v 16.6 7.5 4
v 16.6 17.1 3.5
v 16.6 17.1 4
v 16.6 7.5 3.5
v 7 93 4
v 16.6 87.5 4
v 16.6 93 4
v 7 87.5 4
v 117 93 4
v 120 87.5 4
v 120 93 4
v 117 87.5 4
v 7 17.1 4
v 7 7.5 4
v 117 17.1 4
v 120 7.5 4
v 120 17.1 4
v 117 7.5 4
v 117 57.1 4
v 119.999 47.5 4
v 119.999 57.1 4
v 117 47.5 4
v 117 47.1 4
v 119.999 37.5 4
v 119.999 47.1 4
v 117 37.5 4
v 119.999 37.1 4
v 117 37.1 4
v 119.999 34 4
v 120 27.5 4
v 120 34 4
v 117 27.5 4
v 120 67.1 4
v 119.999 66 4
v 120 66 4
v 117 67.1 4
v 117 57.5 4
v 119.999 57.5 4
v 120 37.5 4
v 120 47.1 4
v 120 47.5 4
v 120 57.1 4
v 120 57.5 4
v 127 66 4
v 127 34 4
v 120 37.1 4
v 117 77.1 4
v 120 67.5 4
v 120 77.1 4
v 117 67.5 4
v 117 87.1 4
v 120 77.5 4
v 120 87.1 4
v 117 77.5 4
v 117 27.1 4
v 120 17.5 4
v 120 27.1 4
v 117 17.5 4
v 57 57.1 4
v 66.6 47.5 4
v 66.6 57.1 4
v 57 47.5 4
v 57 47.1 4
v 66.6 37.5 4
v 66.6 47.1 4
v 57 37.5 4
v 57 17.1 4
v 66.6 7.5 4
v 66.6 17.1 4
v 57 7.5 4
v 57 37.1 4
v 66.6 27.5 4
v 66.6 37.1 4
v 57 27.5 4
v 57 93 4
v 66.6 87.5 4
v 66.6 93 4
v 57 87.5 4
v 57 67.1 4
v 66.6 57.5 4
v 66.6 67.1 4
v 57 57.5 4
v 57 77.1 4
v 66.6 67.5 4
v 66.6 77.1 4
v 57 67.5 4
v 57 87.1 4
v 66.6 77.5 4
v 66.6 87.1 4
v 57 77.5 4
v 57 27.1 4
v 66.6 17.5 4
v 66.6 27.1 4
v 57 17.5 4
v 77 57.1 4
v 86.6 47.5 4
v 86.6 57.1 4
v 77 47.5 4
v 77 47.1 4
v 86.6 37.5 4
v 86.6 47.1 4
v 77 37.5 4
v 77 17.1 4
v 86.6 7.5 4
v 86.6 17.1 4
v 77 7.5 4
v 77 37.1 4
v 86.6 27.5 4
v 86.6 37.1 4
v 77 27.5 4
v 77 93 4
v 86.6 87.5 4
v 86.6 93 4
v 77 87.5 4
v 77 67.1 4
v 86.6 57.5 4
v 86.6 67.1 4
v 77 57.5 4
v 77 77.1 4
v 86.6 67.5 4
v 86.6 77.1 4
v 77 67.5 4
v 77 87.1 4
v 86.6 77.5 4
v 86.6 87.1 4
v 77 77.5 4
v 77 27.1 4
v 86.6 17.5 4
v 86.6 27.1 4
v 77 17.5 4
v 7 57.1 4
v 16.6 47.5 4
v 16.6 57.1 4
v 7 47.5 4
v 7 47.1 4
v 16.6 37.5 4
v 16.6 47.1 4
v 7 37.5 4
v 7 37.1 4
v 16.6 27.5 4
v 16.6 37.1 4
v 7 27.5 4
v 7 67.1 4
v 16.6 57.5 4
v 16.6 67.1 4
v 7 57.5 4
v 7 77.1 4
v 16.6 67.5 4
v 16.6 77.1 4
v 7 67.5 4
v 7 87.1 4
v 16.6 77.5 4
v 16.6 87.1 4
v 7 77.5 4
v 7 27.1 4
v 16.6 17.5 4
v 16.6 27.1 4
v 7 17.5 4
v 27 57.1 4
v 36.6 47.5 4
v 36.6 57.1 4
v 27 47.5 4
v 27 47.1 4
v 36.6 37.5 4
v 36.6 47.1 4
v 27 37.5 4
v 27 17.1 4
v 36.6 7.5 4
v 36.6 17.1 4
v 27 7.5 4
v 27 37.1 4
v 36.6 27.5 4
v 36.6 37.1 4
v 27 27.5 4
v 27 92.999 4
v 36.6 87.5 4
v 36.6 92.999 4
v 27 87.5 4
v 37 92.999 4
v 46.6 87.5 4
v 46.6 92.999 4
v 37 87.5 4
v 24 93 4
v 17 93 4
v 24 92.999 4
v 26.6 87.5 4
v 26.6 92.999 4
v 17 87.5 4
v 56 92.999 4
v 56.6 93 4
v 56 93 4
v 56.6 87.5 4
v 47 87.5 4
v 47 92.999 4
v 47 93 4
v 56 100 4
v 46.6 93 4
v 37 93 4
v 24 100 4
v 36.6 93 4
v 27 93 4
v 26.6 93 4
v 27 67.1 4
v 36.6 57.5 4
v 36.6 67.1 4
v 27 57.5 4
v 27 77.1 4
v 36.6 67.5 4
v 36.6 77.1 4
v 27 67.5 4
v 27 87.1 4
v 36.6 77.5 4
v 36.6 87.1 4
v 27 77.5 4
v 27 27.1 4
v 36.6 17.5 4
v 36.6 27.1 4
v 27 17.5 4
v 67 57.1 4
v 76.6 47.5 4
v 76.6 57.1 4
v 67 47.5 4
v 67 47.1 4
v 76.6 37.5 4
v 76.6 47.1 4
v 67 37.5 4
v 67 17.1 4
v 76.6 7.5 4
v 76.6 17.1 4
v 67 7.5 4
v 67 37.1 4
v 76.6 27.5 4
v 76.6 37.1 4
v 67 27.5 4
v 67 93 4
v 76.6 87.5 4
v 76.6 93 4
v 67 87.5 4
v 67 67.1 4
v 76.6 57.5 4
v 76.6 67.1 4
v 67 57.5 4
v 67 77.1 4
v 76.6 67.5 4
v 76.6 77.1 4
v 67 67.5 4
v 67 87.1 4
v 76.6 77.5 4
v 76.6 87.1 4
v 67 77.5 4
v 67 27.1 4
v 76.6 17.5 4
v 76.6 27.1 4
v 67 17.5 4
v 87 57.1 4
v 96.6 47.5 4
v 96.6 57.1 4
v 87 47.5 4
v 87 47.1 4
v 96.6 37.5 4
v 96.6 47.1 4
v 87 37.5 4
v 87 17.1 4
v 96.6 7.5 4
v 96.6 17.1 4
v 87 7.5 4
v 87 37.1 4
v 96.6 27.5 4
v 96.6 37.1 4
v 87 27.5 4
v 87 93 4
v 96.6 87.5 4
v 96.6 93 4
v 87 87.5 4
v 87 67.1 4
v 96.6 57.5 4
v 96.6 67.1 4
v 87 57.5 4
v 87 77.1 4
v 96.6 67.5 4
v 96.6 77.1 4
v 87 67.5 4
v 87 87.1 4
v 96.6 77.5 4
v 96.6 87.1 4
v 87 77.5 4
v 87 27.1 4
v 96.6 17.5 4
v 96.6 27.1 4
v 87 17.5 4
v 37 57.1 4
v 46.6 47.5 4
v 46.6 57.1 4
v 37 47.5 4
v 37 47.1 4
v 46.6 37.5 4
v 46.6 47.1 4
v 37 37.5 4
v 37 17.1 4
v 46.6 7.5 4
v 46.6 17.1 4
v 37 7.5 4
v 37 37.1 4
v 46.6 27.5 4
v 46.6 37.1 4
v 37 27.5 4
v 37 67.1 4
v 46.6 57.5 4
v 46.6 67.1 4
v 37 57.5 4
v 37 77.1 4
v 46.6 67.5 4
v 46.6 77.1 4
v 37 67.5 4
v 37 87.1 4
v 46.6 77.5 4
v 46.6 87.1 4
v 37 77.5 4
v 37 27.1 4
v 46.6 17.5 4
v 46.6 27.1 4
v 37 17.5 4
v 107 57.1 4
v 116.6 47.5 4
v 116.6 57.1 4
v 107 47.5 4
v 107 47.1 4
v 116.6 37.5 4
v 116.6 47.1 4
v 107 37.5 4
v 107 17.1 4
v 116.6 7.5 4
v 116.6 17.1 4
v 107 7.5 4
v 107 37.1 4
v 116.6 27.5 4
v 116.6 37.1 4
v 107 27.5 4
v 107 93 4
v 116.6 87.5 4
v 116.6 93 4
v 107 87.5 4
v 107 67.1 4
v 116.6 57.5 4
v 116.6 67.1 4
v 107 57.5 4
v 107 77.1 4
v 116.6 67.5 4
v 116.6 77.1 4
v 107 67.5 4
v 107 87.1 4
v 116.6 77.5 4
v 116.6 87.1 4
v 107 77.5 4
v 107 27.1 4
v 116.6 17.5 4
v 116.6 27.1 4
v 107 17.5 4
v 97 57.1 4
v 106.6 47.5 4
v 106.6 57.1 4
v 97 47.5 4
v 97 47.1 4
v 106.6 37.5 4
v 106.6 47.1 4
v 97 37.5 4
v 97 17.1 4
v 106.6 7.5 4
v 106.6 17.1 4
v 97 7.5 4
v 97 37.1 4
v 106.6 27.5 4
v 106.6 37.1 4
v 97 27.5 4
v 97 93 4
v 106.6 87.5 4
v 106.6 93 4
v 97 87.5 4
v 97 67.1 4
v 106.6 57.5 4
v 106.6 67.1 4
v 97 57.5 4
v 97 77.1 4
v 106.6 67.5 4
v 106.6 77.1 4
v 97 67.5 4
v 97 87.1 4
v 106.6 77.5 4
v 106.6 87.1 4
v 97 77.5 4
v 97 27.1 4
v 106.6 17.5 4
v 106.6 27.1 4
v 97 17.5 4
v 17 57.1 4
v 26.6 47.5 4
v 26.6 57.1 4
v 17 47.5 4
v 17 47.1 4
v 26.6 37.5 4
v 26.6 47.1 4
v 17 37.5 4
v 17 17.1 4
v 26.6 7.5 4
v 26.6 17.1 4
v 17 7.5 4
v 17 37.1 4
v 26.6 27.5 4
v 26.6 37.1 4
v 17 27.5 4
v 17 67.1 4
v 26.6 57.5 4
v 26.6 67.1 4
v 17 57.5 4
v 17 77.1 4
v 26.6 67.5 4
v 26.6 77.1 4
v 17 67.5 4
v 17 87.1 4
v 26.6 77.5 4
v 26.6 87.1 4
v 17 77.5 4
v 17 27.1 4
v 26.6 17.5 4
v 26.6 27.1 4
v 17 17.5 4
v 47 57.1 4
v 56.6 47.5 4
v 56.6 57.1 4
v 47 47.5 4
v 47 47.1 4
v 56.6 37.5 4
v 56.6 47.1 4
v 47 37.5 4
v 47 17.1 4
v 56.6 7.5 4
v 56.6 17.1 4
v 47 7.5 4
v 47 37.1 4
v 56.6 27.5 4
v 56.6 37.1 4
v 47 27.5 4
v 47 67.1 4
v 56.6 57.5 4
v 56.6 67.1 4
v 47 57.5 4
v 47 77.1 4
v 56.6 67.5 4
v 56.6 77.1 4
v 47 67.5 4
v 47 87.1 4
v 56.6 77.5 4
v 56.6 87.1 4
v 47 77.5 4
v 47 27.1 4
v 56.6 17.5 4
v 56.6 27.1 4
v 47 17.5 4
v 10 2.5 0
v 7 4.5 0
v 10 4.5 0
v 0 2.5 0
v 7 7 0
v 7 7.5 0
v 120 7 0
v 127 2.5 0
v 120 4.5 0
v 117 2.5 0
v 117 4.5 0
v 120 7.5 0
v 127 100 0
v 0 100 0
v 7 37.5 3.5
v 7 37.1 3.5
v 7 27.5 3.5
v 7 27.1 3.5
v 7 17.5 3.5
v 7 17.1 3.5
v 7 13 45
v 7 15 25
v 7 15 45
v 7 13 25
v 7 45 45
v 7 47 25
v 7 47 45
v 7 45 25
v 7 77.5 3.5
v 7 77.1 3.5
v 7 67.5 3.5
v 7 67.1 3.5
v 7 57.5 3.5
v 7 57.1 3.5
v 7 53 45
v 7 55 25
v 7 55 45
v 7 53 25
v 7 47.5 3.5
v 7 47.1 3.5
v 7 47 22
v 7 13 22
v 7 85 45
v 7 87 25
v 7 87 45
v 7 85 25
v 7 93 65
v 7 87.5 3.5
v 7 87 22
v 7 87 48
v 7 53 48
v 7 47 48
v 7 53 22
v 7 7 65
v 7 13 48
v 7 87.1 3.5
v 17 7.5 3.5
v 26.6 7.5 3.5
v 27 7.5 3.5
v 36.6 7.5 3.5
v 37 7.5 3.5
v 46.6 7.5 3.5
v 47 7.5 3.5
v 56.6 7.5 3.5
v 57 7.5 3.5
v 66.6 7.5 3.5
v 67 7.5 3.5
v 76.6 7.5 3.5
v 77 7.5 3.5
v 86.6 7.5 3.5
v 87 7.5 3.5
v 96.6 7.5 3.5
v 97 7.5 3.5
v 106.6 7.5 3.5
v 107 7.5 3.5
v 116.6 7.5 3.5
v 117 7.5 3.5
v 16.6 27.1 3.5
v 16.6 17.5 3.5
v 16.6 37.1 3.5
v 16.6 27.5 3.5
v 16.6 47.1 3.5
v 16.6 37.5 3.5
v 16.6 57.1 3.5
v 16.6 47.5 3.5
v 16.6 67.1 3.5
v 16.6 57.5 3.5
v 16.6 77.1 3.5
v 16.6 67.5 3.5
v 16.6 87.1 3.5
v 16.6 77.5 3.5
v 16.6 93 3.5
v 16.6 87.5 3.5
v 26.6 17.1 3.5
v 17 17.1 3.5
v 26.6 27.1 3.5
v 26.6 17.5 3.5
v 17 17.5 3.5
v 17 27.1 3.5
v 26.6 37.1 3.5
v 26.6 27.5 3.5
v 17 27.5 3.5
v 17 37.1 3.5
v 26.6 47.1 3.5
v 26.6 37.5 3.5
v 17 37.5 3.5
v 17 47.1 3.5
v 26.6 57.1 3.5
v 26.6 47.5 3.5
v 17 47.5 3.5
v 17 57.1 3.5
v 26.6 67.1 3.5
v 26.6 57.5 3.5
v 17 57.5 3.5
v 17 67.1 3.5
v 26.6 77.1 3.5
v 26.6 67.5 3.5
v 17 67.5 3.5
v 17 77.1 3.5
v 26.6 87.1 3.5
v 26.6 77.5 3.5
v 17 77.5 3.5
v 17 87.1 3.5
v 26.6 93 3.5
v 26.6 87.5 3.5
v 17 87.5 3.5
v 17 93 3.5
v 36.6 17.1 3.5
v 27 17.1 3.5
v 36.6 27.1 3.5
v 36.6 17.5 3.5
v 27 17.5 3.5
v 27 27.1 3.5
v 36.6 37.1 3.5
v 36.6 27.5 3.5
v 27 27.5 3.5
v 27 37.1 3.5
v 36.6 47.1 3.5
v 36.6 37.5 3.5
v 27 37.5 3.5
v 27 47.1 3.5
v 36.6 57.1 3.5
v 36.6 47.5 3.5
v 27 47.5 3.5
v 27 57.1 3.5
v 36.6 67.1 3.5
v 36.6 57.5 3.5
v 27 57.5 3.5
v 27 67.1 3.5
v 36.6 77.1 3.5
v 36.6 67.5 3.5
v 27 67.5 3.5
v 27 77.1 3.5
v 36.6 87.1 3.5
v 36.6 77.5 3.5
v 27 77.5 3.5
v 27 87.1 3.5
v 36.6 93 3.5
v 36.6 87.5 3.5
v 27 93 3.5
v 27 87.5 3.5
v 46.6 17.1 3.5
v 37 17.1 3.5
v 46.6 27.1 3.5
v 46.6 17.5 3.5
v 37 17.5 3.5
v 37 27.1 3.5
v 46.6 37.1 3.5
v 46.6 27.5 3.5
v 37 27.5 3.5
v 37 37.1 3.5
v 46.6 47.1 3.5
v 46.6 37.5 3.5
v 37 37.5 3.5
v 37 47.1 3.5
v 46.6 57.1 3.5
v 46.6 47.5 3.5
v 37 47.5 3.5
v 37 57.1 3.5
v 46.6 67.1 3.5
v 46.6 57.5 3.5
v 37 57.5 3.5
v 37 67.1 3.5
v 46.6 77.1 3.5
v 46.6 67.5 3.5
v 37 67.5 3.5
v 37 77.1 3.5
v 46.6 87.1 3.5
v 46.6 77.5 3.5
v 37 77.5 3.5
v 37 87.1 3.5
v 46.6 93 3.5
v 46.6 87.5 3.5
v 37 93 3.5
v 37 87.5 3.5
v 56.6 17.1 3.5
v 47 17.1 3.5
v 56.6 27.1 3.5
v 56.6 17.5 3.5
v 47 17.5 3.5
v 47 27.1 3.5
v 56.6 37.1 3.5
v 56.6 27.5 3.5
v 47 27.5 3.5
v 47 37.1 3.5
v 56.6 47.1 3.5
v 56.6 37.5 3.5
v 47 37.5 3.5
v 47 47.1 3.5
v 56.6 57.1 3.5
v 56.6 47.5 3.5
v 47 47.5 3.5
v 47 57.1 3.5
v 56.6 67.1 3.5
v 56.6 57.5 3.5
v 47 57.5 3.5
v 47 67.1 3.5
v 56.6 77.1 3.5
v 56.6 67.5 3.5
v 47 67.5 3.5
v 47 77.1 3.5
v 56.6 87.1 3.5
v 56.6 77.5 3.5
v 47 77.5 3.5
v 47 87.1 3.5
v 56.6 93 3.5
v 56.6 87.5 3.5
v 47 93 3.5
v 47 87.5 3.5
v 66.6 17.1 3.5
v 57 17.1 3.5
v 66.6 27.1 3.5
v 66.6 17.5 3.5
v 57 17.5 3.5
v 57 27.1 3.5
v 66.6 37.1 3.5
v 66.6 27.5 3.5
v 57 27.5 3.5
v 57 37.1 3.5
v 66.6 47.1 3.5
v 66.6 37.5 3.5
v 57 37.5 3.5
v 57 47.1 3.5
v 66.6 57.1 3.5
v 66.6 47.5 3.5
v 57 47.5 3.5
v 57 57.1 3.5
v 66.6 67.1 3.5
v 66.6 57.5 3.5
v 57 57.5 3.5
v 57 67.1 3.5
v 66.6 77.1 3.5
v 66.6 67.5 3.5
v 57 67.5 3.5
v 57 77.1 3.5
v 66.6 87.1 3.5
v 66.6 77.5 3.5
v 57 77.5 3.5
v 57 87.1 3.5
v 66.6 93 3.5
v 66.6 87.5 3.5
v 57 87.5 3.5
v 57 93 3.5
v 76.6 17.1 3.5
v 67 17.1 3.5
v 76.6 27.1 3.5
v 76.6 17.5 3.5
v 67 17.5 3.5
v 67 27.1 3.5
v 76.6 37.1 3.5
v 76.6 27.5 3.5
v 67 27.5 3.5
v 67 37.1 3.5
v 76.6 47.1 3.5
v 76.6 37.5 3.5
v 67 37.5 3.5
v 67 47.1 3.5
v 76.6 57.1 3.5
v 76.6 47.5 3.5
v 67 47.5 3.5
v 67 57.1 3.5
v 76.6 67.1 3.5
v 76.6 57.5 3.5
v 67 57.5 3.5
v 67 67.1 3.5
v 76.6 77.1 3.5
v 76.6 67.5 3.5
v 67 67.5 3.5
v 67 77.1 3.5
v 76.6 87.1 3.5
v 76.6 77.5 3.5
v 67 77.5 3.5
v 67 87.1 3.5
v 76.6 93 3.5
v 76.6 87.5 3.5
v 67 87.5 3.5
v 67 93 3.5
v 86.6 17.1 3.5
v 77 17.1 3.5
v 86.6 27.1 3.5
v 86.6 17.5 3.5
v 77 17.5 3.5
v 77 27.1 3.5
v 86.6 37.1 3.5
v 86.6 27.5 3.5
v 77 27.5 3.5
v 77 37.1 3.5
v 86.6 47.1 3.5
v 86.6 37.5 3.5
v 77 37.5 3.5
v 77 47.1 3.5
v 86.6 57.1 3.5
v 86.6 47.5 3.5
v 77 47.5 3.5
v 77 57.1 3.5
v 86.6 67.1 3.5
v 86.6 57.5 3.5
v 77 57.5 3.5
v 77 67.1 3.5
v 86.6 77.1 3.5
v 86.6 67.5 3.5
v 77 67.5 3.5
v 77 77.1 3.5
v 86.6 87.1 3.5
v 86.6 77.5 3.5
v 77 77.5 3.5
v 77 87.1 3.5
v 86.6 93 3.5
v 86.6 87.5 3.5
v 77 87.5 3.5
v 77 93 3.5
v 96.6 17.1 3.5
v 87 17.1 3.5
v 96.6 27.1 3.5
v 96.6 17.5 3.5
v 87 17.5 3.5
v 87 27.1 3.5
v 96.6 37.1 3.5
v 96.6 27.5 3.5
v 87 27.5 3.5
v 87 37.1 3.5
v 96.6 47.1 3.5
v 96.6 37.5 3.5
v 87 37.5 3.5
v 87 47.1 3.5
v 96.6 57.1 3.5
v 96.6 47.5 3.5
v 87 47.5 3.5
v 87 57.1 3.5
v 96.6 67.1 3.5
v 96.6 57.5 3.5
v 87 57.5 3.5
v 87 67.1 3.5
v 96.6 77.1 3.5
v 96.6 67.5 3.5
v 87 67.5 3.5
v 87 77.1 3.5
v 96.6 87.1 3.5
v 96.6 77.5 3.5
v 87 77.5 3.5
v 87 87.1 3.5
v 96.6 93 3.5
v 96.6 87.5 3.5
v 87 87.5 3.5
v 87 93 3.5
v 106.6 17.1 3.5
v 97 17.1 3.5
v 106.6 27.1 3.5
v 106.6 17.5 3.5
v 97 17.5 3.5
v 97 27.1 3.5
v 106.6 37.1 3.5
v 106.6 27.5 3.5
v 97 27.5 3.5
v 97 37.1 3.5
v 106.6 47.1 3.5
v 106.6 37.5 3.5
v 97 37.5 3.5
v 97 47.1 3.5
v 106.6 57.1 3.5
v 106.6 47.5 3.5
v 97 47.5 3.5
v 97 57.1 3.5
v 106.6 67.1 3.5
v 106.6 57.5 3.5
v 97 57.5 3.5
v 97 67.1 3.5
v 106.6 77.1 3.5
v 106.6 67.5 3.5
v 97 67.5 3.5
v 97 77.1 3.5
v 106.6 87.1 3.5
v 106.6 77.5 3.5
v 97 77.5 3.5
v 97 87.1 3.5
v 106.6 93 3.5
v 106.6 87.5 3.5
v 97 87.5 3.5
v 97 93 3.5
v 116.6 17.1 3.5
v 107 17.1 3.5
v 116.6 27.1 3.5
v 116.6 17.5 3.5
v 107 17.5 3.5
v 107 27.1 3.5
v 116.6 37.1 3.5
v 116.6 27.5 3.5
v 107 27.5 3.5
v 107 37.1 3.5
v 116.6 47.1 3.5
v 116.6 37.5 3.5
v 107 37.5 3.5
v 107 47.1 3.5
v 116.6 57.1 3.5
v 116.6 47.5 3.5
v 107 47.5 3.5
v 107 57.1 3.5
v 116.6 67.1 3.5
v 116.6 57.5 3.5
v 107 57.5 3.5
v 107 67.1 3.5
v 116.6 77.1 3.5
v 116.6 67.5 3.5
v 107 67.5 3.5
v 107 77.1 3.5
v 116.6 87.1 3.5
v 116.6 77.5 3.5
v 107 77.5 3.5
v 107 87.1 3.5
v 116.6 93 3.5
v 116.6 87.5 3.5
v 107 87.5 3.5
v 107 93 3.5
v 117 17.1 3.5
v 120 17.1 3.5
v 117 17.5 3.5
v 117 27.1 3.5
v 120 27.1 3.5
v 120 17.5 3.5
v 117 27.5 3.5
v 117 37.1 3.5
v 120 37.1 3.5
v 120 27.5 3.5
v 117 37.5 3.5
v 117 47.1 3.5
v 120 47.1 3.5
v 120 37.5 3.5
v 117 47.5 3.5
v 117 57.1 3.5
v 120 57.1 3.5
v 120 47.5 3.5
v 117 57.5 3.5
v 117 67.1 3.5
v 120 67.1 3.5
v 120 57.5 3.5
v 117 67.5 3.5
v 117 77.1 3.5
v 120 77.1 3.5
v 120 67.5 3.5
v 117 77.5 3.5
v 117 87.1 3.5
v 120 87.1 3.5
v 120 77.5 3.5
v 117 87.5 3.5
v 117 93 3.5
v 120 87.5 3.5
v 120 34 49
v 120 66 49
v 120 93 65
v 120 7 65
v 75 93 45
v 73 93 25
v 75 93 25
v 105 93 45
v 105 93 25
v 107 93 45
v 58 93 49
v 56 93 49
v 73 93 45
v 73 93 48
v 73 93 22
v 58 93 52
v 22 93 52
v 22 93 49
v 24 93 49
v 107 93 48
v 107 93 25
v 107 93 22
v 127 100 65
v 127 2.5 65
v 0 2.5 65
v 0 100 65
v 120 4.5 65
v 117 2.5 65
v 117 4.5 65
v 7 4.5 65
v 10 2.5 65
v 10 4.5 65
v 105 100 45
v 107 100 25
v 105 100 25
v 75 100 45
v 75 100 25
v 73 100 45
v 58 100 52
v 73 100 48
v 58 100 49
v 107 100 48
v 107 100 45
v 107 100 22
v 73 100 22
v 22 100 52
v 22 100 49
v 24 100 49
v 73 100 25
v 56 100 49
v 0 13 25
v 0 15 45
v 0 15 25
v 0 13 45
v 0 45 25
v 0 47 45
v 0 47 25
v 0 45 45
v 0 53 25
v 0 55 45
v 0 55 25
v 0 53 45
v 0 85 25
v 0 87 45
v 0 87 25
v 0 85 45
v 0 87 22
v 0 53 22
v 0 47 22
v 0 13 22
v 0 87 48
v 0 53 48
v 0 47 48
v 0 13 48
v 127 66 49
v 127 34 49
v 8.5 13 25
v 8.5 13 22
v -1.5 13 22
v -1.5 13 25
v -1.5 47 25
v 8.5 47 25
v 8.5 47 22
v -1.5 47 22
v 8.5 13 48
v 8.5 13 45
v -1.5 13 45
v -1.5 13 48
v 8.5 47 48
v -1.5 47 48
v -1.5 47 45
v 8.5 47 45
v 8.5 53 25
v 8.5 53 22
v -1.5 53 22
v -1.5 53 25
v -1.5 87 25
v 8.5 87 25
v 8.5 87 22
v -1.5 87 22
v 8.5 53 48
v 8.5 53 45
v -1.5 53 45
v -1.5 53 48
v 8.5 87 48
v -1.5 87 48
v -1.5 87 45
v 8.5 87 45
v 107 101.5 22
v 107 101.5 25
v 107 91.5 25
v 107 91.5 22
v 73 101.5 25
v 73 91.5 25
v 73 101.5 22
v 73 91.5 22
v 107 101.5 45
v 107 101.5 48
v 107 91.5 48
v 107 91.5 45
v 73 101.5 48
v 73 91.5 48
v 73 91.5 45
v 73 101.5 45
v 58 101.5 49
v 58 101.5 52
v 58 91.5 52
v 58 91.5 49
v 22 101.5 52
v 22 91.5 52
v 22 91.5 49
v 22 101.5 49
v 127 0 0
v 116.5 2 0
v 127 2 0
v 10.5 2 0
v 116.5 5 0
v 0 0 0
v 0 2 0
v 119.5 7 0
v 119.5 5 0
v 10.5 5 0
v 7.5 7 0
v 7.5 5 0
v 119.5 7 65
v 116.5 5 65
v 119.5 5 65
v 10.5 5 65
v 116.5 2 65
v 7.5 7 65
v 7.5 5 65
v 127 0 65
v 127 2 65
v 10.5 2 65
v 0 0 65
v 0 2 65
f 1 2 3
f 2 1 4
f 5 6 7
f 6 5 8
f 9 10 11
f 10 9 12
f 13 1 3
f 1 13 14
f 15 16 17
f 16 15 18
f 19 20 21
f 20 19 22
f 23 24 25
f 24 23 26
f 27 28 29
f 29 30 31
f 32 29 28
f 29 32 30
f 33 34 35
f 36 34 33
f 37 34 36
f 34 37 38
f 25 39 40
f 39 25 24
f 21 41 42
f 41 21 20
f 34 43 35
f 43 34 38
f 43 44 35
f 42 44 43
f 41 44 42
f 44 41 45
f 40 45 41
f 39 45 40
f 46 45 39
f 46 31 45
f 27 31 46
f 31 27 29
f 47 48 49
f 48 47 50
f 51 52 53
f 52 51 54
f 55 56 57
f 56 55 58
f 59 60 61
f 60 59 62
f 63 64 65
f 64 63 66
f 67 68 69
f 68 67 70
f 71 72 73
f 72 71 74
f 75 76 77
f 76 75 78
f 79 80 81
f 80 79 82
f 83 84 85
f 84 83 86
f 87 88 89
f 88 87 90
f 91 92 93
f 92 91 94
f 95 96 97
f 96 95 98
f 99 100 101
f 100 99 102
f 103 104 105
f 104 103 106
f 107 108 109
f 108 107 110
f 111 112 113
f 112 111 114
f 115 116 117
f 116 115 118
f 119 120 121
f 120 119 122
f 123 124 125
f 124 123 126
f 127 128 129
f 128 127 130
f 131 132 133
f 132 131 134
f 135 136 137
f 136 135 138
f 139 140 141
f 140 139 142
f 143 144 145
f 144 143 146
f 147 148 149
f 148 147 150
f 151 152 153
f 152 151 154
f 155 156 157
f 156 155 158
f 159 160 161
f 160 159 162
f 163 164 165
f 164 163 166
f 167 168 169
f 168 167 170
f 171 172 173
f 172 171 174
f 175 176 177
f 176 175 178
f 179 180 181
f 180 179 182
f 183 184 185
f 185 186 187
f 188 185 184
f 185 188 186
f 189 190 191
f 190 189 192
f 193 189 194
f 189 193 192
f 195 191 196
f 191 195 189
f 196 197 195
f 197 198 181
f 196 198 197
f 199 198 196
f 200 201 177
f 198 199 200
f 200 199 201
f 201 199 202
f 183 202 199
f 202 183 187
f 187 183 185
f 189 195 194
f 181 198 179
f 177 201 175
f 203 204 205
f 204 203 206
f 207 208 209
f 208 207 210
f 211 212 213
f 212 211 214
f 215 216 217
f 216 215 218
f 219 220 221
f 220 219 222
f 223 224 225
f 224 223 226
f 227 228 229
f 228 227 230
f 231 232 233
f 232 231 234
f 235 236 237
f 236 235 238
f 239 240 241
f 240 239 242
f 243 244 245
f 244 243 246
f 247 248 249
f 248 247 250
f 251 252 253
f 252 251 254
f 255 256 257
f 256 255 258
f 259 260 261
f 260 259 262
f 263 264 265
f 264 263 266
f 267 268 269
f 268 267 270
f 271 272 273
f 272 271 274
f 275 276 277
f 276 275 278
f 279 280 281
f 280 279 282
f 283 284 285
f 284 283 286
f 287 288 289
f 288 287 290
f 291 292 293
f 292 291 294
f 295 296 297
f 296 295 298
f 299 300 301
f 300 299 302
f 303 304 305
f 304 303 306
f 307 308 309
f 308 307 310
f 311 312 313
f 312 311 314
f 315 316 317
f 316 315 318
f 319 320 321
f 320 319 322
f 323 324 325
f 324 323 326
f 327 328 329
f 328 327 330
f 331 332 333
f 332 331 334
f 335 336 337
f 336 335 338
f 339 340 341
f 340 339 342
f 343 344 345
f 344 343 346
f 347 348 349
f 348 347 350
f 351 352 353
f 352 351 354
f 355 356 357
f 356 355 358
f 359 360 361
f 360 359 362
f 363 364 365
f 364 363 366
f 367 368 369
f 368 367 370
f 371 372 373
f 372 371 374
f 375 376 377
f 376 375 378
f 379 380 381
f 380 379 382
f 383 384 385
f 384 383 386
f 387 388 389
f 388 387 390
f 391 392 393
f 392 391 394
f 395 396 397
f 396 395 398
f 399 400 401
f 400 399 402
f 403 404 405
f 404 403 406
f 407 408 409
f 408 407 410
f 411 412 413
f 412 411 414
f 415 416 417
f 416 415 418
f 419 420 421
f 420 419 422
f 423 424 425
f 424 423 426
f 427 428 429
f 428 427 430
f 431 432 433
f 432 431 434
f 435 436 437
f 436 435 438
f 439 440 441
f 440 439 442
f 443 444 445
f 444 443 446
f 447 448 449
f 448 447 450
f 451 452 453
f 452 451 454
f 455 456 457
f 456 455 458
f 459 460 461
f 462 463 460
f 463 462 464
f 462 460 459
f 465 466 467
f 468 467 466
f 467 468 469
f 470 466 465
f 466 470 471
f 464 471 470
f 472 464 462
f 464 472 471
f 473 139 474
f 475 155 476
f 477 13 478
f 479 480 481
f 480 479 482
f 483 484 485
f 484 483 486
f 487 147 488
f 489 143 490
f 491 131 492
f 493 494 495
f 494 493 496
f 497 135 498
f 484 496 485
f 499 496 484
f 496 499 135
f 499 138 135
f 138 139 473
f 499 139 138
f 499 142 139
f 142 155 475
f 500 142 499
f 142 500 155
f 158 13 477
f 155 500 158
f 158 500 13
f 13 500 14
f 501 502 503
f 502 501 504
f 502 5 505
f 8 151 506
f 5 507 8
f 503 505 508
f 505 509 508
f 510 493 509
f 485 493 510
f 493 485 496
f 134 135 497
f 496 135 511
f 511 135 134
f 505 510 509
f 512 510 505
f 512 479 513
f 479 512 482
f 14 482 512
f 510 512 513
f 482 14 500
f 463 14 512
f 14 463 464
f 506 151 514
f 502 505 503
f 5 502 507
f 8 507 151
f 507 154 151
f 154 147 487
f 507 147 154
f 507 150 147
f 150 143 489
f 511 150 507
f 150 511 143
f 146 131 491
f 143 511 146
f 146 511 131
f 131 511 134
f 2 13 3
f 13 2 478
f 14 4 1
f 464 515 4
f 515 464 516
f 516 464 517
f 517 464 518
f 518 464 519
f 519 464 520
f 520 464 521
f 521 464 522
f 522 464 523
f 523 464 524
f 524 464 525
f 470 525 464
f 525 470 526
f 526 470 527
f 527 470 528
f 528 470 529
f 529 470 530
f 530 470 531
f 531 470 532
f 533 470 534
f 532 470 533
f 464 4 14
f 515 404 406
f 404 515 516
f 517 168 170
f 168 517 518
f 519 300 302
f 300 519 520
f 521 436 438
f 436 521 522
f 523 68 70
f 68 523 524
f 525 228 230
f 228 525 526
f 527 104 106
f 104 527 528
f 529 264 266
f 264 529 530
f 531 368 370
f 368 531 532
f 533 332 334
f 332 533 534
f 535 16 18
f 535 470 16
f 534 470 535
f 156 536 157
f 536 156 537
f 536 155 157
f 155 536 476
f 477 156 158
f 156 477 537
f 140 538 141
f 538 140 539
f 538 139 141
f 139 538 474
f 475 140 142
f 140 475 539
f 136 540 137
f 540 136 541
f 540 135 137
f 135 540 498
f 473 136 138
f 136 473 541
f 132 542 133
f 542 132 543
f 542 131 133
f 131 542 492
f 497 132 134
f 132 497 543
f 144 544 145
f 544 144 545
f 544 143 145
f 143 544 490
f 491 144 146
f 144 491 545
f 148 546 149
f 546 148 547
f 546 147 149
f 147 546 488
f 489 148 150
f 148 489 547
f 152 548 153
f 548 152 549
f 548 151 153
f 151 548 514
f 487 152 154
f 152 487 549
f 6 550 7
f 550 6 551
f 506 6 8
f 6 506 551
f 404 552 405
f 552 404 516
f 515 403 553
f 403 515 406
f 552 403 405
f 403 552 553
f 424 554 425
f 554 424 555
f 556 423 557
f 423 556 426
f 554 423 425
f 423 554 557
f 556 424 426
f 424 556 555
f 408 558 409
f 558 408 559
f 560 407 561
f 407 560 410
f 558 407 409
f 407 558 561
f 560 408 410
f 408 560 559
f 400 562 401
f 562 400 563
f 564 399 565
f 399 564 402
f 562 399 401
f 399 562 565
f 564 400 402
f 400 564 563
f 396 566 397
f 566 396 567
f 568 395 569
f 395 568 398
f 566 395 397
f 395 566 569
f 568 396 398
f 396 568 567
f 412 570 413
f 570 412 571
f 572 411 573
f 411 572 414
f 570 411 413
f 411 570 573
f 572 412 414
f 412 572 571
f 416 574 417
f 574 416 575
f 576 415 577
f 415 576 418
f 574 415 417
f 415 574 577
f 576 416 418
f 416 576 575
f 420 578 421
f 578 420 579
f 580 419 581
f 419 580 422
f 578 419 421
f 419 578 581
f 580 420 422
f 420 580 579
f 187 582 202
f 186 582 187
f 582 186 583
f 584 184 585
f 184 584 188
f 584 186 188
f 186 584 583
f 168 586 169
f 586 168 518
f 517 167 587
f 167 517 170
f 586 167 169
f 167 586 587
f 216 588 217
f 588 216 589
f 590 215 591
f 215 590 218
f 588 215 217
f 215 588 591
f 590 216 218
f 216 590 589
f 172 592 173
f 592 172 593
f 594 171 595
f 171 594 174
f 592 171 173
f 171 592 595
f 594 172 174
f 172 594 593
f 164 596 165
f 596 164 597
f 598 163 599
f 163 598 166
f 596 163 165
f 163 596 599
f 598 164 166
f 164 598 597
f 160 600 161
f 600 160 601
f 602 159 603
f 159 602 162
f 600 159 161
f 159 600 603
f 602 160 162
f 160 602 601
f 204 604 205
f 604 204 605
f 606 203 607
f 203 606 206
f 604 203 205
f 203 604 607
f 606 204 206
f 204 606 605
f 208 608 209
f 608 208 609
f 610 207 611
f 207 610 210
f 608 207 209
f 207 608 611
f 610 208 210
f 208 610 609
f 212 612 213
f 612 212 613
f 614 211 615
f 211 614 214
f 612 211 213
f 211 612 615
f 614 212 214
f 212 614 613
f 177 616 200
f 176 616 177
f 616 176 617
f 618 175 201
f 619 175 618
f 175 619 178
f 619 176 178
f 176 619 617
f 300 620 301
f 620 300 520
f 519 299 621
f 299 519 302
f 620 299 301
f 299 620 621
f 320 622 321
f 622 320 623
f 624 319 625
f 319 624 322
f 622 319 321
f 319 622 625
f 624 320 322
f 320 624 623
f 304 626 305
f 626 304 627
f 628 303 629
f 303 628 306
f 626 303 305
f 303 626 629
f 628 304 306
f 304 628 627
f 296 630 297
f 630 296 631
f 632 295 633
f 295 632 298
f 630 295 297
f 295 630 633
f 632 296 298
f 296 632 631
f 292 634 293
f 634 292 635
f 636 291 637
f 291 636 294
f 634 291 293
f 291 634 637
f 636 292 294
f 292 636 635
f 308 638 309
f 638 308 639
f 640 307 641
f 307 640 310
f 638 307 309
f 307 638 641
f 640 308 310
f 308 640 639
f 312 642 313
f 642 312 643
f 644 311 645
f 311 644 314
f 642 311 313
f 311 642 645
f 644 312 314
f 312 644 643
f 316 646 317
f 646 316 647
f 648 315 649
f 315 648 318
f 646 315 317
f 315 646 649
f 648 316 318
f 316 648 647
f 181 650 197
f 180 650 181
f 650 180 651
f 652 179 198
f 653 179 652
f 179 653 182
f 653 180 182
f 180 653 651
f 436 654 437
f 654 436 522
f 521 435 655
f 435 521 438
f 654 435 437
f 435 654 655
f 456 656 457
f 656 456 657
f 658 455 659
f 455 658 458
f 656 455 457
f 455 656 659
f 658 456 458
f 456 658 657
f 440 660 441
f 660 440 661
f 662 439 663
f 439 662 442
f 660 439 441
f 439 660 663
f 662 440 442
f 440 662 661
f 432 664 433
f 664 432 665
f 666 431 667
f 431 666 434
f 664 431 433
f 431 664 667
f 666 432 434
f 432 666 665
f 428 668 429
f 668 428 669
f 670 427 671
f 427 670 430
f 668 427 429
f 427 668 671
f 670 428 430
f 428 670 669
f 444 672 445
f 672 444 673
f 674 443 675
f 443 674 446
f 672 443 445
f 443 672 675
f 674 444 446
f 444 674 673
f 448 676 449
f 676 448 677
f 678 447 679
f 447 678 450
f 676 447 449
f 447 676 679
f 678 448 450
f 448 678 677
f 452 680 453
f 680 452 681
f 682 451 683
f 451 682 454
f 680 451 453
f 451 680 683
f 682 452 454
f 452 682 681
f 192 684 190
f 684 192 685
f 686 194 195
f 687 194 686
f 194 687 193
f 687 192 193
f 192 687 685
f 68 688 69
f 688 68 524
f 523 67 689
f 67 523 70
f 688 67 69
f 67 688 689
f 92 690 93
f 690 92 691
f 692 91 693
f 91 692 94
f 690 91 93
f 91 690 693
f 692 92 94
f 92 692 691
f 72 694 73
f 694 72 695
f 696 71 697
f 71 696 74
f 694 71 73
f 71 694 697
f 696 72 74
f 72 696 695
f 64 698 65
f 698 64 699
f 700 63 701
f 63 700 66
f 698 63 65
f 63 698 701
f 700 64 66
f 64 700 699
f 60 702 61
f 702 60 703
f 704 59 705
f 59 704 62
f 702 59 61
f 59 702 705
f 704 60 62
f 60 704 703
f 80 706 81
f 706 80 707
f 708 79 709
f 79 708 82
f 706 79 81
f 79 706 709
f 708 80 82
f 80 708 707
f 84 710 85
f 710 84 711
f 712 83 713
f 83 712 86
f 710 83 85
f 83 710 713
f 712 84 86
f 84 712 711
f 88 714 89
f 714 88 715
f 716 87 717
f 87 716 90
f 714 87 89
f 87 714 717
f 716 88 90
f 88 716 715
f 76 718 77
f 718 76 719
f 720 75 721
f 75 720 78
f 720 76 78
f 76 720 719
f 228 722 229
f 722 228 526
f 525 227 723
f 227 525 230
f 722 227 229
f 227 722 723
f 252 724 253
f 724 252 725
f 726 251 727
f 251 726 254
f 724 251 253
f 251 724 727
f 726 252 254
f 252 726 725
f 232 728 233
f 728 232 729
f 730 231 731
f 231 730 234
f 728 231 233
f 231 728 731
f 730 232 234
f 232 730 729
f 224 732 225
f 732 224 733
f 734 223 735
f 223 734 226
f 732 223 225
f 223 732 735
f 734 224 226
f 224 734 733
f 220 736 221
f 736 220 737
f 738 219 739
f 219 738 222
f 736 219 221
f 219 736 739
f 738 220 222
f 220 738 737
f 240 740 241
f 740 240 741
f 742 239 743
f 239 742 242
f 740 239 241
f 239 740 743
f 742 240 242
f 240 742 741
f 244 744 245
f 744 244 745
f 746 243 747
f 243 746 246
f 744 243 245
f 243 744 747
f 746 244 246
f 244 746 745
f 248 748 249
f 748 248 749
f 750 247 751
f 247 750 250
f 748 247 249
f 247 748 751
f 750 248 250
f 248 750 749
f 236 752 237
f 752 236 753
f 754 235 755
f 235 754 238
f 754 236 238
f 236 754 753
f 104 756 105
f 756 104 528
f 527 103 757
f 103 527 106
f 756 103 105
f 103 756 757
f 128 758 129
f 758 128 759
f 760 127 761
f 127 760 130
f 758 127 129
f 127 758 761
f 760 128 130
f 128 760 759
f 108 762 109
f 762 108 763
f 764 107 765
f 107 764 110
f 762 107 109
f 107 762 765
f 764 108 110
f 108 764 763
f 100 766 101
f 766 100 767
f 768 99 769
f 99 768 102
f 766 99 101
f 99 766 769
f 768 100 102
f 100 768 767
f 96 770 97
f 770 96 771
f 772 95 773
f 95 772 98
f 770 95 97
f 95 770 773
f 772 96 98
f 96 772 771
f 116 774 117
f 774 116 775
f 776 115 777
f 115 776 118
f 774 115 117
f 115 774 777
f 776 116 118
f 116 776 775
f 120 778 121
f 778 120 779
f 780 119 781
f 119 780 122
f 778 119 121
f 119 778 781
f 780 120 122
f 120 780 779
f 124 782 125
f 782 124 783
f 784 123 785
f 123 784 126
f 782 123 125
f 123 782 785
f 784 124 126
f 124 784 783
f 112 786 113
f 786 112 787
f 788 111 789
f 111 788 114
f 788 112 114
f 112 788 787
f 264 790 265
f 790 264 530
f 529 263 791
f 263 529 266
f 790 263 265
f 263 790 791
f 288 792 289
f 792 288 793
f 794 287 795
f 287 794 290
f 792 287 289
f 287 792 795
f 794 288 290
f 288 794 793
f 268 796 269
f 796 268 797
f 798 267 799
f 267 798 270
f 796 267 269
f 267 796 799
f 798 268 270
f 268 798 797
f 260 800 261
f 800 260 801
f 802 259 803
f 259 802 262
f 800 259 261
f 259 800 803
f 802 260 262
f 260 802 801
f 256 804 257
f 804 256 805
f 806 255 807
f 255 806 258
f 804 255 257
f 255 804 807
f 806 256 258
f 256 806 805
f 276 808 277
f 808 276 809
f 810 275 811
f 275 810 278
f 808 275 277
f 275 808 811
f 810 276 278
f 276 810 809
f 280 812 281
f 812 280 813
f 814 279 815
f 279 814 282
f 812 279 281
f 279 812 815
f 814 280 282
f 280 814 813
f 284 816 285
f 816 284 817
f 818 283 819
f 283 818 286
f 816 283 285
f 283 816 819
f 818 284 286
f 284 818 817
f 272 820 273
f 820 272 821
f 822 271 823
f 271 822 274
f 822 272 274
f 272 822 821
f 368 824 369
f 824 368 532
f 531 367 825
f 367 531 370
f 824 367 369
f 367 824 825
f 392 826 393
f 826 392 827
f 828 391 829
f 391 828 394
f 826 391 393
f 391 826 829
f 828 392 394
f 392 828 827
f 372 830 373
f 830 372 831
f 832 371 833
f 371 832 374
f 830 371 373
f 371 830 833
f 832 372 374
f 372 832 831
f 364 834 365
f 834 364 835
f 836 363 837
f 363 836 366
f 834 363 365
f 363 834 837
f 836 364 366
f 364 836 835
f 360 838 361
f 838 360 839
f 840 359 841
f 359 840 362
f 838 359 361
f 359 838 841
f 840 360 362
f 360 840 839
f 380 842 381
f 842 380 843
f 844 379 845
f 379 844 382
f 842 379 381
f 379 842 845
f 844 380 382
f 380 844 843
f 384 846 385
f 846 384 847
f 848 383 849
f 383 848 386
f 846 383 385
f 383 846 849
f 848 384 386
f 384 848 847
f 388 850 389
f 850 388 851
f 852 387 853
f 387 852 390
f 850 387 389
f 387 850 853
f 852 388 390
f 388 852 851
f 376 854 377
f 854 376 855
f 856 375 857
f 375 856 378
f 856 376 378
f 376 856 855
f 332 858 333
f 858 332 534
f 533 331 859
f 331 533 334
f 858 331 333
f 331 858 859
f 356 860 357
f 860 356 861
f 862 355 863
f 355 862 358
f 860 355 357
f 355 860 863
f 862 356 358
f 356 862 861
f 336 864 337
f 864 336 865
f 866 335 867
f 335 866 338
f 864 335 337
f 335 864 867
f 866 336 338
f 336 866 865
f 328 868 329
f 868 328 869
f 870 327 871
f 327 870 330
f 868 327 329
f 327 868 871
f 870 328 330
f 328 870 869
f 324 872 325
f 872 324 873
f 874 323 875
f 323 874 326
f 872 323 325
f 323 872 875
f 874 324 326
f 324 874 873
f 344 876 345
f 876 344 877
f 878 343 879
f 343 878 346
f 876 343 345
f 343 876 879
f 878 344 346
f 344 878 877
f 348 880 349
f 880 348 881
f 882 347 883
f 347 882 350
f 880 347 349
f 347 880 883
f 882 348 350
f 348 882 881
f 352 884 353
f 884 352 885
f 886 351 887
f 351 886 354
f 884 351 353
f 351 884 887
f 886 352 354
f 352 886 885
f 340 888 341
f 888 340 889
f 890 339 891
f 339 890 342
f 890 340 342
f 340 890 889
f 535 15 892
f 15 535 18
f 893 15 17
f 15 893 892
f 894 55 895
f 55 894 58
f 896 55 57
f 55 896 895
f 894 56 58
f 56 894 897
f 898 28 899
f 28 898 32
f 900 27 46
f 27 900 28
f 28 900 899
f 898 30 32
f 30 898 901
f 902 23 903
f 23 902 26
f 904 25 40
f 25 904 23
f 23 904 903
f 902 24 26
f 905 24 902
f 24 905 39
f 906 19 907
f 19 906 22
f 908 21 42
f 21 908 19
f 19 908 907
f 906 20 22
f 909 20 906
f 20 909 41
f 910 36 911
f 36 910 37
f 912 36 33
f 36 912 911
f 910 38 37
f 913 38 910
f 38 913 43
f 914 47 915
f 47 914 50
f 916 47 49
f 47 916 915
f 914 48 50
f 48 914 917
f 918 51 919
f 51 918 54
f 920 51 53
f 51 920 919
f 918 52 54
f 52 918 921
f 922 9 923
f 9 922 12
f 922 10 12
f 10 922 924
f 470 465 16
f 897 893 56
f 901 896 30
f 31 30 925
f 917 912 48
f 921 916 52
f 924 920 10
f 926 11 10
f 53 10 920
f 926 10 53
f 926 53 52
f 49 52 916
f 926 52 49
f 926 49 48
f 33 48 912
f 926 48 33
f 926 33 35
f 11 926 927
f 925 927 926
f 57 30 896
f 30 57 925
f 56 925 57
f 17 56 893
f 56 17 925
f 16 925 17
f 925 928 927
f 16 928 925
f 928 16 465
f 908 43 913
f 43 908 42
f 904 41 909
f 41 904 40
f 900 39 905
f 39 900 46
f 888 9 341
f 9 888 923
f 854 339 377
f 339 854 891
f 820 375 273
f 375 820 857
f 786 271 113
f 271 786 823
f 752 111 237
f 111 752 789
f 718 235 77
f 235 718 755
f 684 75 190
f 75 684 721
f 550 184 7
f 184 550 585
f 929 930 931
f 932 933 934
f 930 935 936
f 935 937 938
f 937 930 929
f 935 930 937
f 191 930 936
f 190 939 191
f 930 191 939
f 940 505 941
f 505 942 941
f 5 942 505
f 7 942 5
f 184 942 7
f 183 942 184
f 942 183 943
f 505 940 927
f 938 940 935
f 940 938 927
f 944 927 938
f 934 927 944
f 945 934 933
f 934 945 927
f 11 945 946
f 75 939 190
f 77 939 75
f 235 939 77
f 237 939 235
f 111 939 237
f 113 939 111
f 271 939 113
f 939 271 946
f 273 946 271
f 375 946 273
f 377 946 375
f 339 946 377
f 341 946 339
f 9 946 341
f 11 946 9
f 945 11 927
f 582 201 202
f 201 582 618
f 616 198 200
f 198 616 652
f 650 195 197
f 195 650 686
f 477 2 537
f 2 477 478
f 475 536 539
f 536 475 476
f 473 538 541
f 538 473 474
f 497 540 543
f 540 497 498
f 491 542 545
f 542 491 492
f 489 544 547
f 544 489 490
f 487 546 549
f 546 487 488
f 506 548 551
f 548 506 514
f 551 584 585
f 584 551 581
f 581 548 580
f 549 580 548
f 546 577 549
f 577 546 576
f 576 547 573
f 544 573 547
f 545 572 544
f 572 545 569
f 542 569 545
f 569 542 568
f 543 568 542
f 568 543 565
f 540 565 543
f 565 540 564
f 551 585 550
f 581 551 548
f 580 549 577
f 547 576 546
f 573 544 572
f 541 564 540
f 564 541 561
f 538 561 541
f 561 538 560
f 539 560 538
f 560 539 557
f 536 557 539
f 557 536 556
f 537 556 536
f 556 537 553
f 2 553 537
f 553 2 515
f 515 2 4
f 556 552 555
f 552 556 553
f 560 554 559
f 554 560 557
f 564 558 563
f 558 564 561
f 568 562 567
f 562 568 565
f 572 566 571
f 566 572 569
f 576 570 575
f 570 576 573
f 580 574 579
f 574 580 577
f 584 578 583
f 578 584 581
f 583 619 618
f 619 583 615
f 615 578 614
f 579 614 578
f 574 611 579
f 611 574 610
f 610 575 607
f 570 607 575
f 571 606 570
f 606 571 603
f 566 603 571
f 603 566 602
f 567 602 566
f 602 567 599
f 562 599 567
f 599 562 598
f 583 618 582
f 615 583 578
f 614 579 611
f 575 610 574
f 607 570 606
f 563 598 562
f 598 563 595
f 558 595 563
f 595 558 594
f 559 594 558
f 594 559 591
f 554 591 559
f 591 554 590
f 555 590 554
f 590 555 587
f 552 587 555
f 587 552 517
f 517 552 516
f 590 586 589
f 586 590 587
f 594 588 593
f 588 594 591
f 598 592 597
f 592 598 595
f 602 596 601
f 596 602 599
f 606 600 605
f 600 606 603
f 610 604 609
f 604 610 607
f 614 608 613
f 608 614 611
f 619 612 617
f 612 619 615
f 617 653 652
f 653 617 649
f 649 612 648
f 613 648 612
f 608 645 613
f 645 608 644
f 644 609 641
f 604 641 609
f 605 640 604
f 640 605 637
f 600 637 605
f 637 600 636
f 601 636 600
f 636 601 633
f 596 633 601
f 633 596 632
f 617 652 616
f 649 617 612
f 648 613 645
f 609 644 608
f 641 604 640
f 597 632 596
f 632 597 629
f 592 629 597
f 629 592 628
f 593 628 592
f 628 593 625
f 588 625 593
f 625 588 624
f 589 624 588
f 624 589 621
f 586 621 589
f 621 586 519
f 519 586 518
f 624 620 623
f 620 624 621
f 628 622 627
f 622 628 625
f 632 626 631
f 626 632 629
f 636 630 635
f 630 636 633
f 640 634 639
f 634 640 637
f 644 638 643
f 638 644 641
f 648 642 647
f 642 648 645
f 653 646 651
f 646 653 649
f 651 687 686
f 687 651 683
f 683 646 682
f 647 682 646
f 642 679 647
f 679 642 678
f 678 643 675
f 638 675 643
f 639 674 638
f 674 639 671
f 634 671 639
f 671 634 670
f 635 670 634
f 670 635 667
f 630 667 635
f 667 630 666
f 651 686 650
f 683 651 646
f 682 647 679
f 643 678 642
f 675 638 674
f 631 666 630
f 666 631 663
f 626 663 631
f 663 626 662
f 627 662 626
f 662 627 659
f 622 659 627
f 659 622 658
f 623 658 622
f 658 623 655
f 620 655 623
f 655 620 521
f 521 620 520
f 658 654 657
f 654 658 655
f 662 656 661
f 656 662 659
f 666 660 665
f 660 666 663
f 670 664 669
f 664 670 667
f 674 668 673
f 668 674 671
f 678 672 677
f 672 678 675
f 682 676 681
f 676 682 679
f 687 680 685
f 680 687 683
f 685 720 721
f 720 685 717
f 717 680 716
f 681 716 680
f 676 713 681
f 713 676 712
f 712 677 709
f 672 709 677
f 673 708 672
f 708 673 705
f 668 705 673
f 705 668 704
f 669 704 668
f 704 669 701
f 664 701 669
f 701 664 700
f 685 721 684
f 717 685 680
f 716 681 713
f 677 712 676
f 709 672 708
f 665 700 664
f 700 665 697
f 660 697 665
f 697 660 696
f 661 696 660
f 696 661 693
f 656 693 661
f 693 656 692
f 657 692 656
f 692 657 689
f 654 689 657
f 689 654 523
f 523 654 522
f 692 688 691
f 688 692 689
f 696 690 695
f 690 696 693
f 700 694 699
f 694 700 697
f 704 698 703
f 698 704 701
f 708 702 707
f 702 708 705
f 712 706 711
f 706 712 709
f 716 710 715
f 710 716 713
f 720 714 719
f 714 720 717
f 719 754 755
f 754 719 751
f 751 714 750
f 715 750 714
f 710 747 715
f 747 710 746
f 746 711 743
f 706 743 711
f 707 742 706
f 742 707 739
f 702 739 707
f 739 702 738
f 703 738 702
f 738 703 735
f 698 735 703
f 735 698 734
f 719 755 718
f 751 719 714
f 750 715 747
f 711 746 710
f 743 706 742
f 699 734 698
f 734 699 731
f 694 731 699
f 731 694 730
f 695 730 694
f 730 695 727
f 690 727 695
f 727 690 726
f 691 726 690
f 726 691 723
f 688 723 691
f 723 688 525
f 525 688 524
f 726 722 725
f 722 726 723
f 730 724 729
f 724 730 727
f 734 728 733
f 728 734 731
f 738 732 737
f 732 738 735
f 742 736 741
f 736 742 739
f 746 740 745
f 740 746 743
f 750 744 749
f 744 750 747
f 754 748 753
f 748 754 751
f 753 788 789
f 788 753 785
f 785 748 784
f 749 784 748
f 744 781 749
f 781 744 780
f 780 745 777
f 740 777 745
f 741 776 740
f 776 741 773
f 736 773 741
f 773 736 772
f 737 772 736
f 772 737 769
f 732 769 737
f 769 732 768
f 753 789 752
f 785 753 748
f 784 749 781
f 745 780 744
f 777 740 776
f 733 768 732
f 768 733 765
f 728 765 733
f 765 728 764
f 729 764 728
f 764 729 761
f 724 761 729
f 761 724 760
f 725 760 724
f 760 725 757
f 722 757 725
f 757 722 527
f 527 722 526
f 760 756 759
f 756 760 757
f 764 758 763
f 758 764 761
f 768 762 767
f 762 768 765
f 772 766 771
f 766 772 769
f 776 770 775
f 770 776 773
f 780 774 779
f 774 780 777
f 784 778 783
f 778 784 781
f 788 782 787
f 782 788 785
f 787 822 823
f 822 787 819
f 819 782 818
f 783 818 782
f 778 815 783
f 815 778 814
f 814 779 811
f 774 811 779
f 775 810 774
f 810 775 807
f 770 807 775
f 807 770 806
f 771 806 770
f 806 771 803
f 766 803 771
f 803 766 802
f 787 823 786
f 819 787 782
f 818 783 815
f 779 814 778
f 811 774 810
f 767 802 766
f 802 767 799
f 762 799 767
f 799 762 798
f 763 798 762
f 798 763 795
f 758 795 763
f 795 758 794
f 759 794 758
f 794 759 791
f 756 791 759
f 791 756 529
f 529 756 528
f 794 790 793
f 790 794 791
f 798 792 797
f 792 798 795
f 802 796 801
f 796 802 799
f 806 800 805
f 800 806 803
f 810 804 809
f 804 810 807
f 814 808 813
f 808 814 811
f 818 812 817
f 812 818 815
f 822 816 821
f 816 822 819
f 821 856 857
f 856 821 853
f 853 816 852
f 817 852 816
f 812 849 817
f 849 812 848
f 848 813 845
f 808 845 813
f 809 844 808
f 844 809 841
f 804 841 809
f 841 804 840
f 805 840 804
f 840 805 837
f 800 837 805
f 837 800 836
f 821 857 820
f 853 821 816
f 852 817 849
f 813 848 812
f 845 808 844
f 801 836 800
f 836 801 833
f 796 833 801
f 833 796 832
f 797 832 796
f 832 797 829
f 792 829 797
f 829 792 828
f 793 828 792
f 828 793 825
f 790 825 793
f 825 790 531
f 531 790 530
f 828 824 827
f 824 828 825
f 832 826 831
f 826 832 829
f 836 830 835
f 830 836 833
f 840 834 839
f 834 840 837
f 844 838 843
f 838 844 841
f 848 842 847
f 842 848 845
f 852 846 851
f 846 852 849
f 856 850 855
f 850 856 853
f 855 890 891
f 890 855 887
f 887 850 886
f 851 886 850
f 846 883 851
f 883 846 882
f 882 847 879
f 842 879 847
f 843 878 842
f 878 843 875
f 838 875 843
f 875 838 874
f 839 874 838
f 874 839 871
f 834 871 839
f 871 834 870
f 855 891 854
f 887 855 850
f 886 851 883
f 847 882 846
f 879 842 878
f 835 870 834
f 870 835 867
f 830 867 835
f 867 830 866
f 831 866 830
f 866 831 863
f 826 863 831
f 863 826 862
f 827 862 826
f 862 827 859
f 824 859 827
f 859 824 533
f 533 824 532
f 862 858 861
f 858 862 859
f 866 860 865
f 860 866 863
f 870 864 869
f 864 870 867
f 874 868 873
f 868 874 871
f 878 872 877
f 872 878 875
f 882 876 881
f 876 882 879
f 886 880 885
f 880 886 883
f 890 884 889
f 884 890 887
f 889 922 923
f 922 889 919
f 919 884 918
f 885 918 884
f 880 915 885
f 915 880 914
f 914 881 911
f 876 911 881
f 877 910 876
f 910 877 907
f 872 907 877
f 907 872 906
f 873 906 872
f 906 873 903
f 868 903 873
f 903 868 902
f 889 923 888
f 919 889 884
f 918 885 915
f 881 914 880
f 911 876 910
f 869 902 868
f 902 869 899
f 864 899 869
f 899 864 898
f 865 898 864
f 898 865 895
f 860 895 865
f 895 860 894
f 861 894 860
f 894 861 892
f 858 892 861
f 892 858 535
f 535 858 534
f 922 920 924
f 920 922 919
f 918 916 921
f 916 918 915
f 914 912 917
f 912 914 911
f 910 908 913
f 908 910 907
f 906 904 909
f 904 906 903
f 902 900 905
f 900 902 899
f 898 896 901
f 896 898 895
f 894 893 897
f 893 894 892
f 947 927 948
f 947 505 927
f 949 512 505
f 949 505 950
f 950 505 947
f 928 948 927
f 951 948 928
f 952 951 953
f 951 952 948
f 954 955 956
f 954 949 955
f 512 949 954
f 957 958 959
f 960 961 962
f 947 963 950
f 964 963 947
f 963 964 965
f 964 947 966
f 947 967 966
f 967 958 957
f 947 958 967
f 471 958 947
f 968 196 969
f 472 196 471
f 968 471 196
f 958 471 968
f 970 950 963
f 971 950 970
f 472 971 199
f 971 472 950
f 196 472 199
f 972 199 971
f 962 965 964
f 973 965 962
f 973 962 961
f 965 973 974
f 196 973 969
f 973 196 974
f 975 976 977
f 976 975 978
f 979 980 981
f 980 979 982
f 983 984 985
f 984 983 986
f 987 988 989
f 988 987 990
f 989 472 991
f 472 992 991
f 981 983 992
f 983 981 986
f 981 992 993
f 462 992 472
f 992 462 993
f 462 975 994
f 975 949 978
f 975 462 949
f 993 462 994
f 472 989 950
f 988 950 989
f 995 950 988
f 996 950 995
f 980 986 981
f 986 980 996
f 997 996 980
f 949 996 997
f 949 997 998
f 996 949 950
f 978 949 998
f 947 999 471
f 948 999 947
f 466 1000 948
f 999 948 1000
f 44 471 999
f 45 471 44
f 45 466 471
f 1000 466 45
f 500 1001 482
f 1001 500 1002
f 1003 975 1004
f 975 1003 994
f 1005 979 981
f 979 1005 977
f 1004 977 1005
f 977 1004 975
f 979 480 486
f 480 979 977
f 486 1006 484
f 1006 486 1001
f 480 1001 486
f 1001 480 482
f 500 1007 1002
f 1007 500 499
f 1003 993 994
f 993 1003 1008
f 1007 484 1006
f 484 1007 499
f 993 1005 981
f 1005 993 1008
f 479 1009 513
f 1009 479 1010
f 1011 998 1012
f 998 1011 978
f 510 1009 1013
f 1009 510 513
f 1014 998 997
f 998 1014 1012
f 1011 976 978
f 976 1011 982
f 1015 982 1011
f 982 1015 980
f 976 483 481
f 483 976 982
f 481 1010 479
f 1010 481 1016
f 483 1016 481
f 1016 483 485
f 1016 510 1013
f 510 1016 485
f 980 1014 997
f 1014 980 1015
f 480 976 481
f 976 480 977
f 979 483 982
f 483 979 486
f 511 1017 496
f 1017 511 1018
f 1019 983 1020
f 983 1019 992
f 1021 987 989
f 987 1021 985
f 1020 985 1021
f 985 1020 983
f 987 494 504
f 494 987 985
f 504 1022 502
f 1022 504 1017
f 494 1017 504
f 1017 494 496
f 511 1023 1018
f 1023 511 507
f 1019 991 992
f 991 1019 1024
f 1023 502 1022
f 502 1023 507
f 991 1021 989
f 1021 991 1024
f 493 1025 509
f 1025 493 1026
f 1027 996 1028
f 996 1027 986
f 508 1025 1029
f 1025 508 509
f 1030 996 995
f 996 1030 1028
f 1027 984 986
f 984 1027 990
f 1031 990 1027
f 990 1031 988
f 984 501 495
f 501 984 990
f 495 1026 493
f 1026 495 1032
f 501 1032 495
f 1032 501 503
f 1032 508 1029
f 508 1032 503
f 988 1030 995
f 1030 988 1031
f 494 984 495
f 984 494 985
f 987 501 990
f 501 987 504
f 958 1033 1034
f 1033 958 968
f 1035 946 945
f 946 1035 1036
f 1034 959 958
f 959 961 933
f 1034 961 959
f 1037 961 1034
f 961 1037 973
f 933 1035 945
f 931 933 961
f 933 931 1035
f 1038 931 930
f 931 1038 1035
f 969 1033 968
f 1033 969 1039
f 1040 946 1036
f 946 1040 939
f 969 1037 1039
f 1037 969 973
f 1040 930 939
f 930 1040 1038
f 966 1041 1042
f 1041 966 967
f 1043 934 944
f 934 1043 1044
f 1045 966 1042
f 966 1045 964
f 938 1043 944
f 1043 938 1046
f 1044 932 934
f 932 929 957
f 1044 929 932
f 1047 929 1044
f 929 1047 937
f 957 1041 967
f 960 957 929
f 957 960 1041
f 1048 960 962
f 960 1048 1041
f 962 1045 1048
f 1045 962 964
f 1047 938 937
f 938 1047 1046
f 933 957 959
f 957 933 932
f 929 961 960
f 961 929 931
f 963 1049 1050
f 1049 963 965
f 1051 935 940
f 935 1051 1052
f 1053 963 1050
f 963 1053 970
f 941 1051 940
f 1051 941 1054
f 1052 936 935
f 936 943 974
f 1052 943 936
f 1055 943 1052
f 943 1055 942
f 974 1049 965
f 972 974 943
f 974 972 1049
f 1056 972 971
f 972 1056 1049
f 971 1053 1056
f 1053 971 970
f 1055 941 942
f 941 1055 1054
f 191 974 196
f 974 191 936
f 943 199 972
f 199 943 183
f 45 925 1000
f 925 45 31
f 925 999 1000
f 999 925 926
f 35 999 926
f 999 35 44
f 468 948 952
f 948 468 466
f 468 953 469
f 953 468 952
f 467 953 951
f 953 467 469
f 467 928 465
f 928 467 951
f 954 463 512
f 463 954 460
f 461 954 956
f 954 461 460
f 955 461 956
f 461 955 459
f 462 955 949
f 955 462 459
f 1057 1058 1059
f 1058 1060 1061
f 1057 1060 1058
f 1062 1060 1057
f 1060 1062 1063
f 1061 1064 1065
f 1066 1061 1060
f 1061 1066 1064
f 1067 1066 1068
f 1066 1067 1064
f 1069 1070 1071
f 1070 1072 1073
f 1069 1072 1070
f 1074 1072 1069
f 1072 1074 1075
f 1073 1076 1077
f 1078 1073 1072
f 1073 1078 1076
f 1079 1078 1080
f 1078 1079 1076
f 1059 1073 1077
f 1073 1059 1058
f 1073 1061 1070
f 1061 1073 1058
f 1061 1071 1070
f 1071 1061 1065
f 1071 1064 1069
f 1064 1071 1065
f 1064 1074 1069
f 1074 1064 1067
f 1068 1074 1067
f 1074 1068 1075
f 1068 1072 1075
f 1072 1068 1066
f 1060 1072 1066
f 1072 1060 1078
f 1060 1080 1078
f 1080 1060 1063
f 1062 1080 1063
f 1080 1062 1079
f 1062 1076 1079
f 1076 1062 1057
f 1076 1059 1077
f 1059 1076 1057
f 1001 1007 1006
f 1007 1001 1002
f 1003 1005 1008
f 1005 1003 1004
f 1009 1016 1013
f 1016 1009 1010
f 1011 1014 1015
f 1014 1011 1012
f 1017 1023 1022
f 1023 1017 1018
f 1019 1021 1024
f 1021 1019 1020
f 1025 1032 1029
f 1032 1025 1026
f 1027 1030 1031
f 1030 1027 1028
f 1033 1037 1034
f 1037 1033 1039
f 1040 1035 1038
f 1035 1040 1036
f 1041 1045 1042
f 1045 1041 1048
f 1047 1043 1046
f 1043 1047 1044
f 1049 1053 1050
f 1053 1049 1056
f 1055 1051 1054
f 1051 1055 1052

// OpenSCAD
use <building.scad>

building(b1Dims, b1Windows, b1Doors);

/* Dims is a vector holding dimensions of the building 
 * [X, Y, height, wall thickness, floor/roof thickness].
 */
b1Dims = [127, // xdim
	     100, // ydim
	     65, // height
	     7, // wall thickness
	     4]; // floor/roof thickness

/* Windows is a 3D array holding translate : rotate pairs, one per window.
 * 
 */
b1Windows = [[[0, 30, 0], [0,0,-90]],
		    [[0, 70, 0], [0,0,-90]],
		    [[90,93,0], [0,0,0]],
		   ];

/* Doors is a 3D array holding translate : rotate : boolean tuples, one per
 * door.
 * Booleans are [ doFrame, unused, unused ].
 */
b1Doors = [[[40, 93, 0], [0,0,0], [1,0,0]],
	   	  [[120, 50, 0], [0,0,-90], [0,0,0]],
          ];
